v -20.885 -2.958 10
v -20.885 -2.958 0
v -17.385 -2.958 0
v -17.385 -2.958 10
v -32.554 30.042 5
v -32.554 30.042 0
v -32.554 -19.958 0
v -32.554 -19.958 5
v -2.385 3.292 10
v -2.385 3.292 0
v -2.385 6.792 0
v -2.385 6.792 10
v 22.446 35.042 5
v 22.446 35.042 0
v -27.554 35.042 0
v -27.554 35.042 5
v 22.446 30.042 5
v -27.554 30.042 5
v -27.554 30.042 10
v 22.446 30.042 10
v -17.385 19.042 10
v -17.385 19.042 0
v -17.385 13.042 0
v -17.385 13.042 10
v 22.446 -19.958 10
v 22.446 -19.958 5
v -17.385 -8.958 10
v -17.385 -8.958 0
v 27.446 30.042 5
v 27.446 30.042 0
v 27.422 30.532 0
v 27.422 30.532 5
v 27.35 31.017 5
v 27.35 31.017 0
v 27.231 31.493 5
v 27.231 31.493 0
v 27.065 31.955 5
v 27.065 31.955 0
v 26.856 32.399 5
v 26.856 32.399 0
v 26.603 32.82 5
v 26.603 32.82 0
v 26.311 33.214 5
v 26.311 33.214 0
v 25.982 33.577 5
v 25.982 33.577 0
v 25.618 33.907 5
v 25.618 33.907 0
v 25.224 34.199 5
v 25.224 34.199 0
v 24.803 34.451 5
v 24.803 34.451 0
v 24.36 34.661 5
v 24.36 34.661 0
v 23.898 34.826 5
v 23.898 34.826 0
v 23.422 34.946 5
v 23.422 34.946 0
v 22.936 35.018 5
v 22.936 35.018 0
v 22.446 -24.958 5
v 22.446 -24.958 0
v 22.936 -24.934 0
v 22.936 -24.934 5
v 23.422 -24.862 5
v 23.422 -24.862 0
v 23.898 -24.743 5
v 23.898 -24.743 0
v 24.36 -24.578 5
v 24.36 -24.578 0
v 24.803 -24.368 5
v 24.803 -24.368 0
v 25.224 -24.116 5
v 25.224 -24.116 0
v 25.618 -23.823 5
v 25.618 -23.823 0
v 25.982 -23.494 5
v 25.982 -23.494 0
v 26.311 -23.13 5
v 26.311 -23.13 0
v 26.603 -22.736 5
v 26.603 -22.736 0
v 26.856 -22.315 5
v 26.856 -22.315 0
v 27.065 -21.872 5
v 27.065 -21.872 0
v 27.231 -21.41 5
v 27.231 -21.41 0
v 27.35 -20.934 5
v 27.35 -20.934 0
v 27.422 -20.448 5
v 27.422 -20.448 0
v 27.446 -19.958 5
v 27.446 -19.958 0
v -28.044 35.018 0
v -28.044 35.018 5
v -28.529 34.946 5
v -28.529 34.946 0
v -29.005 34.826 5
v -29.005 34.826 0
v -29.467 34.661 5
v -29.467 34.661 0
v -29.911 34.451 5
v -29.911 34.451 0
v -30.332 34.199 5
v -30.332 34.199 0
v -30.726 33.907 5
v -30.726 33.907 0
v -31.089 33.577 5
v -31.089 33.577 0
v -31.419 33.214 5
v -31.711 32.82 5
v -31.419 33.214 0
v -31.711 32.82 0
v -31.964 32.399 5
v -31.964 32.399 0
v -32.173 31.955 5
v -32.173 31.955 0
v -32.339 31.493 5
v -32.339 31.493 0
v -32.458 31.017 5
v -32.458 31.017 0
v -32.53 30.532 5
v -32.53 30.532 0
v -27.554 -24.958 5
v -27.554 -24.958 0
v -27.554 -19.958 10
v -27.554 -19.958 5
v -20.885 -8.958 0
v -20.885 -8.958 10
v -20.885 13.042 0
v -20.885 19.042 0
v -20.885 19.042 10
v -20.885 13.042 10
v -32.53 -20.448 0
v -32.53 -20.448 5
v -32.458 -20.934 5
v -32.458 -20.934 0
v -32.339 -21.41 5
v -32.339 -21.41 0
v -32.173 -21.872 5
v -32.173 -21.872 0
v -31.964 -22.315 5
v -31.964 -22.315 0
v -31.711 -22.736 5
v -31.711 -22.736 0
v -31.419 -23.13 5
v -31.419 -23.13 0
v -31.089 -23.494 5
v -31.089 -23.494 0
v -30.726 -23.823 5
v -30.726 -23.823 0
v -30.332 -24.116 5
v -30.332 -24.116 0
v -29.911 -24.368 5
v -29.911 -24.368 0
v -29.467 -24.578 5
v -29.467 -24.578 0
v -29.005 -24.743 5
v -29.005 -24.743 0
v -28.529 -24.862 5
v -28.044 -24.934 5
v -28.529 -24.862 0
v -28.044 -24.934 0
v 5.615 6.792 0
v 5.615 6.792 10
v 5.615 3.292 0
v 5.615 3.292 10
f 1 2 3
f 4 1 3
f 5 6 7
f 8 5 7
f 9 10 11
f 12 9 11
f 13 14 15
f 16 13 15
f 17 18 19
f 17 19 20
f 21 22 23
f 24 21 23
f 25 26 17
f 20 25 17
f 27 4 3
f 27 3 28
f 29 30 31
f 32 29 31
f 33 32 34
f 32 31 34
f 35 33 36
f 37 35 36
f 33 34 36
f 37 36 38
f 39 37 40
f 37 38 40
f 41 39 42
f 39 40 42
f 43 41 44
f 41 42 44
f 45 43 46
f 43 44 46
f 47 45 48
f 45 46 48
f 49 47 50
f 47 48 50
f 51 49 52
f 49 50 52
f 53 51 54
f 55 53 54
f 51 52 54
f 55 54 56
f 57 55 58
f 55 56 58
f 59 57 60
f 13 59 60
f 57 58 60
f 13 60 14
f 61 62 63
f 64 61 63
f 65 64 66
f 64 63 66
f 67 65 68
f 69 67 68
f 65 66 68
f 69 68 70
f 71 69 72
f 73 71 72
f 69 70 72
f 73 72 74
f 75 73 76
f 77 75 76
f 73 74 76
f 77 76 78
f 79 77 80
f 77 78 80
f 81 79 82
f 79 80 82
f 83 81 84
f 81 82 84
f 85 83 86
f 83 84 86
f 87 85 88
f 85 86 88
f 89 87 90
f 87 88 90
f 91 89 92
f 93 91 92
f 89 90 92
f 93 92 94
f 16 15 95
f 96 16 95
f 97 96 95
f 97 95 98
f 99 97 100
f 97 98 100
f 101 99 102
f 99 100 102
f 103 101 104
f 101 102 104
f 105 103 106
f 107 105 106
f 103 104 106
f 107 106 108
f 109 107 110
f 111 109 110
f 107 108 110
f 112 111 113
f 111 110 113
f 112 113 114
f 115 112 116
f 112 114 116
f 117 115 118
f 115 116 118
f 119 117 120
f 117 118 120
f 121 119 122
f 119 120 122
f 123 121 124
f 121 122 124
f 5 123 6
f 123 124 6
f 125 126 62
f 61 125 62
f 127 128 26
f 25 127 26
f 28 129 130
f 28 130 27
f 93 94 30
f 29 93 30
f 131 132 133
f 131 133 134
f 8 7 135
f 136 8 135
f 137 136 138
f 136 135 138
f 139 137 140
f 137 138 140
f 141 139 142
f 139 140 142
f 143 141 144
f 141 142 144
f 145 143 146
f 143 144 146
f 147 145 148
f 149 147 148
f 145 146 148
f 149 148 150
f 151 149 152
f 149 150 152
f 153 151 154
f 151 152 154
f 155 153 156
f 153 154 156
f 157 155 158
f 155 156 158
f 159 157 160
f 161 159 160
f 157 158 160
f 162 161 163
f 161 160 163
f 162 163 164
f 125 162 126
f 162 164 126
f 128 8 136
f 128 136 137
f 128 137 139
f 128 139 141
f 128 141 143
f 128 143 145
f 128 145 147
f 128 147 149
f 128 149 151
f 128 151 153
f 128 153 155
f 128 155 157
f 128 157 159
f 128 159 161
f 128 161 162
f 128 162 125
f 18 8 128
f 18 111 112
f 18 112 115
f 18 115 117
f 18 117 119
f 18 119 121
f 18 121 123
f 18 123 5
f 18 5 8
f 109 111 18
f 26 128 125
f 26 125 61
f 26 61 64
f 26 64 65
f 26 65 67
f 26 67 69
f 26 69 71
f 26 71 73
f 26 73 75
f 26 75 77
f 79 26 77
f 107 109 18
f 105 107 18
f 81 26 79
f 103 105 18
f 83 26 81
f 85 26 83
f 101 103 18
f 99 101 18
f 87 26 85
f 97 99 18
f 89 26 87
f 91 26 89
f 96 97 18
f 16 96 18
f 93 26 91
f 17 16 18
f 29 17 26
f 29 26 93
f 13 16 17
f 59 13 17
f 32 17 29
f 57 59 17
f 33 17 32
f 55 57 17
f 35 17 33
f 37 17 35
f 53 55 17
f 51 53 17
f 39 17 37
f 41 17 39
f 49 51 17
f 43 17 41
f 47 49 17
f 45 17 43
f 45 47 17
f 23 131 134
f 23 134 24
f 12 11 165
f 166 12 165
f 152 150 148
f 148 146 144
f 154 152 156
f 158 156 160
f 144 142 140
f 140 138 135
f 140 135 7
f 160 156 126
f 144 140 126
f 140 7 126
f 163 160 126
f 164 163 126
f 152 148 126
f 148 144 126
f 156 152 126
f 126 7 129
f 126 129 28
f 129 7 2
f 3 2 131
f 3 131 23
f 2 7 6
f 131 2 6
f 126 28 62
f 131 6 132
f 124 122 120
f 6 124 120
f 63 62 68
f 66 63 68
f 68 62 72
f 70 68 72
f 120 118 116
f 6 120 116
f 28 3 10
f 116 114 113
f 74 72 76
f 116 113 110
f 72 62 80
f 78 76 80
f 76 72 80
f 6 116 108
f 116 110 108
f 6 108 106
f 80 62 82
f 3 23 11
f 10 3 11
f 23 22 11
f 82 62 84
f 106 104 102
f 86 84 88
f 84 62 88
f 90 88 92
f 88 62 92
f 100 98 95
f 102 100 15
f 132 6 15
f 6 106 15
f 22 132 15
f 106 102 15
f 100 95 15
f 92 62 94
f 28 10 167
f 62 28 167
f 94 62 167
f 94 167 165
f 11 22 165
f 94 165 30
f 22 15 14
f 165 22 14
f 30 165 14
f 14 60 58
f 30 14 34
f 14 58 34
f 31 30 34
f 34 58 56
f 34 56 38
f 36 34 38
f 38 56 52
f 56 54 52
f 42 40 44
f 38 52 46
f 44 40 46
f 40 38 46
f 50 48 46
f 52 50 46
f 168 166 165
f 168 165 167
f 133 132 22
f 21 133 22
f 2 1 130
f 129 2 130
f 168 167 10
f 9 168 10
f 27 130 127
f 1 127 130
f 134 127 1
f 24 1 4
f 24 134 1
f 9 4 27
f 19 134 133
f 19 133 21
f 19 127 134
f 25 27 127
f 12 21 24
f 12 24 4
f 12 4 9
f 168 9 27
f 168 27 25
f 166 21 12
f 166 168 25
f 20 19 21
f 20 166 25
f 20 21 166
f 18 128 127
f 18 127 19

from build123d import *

# Parameters (mm, degrees)
F1_DEPTH = 5
F2_W     = 50
F2_H     = 50
F3_DEPTH = 5
F4_W     = 3.5
F4_H     = 6
F5_DEPTH = 25


with BuildPart() as f1:
    # F0 (on Top) → F1 (new body)
    with BuildSketch(Plane.XY):
        with BuildLine():
            Line((22.44609, 35.041678), (-27.55391, 35.041678))
            ThreePointArc((-27.55391, 35.041678), (-31.089444, 33.577212), (-32.55391, 30.041678))
            Line((-32.55391, 30.041678), (-32.55391, -19.958322))
            ThreePointArc((-32.55391, -19.958322), (-31.089444, -23.493856), (-27.55391, -24.958322))
            Line((-27.55391, -24.958322), (22.44609, -24.958322))
            ThreePointArc((22.44609, -24.958322), (25.981624, -23.493856), (27.44609, -19.958322))
            Line((27.44609, -19.958322), (27.44609, 30.041678))
            ThreePointArc((27.44609, 30.041678), (25.981624, 33.577212), (22.44609, 35.041678))
        make_face()
    extrude(amount=F1_DEPTH)

    # F2 (on face) → F3 (join)
    with BuildSketch(Plane.XY.offset(5)):
        with Locations((-2.55391, 5.041678)):
            Rectangle(F2_W, F2_H)
    extrude(amount=F3_DEPTH)

    # F4 (on face) → F5 (cut)
    with BuildSketch(Plane(origin=(0, 0, 0), x_dir=(1, 0, 0), z_dir=(0, 0, -1))):
        Polygon((-2.38457, -5.041678), (-2.38457, -6.791678), (5.61543, -6.791678), (5.61543, -5.041678), (5.61543, -3.291678), (-2.38457, -3.291678), align=None)
        with Locations((-19.13457, 5.958322)):
            Rectangle(F4_W, F4_H)
        with Locations((-19.13457, -16.041678)):
            Rectangle(F4_W, F4_H)
    extrude(amount=-F5_DEPTH, mode=Mode.SUBTRACT)


solid = f1.part
